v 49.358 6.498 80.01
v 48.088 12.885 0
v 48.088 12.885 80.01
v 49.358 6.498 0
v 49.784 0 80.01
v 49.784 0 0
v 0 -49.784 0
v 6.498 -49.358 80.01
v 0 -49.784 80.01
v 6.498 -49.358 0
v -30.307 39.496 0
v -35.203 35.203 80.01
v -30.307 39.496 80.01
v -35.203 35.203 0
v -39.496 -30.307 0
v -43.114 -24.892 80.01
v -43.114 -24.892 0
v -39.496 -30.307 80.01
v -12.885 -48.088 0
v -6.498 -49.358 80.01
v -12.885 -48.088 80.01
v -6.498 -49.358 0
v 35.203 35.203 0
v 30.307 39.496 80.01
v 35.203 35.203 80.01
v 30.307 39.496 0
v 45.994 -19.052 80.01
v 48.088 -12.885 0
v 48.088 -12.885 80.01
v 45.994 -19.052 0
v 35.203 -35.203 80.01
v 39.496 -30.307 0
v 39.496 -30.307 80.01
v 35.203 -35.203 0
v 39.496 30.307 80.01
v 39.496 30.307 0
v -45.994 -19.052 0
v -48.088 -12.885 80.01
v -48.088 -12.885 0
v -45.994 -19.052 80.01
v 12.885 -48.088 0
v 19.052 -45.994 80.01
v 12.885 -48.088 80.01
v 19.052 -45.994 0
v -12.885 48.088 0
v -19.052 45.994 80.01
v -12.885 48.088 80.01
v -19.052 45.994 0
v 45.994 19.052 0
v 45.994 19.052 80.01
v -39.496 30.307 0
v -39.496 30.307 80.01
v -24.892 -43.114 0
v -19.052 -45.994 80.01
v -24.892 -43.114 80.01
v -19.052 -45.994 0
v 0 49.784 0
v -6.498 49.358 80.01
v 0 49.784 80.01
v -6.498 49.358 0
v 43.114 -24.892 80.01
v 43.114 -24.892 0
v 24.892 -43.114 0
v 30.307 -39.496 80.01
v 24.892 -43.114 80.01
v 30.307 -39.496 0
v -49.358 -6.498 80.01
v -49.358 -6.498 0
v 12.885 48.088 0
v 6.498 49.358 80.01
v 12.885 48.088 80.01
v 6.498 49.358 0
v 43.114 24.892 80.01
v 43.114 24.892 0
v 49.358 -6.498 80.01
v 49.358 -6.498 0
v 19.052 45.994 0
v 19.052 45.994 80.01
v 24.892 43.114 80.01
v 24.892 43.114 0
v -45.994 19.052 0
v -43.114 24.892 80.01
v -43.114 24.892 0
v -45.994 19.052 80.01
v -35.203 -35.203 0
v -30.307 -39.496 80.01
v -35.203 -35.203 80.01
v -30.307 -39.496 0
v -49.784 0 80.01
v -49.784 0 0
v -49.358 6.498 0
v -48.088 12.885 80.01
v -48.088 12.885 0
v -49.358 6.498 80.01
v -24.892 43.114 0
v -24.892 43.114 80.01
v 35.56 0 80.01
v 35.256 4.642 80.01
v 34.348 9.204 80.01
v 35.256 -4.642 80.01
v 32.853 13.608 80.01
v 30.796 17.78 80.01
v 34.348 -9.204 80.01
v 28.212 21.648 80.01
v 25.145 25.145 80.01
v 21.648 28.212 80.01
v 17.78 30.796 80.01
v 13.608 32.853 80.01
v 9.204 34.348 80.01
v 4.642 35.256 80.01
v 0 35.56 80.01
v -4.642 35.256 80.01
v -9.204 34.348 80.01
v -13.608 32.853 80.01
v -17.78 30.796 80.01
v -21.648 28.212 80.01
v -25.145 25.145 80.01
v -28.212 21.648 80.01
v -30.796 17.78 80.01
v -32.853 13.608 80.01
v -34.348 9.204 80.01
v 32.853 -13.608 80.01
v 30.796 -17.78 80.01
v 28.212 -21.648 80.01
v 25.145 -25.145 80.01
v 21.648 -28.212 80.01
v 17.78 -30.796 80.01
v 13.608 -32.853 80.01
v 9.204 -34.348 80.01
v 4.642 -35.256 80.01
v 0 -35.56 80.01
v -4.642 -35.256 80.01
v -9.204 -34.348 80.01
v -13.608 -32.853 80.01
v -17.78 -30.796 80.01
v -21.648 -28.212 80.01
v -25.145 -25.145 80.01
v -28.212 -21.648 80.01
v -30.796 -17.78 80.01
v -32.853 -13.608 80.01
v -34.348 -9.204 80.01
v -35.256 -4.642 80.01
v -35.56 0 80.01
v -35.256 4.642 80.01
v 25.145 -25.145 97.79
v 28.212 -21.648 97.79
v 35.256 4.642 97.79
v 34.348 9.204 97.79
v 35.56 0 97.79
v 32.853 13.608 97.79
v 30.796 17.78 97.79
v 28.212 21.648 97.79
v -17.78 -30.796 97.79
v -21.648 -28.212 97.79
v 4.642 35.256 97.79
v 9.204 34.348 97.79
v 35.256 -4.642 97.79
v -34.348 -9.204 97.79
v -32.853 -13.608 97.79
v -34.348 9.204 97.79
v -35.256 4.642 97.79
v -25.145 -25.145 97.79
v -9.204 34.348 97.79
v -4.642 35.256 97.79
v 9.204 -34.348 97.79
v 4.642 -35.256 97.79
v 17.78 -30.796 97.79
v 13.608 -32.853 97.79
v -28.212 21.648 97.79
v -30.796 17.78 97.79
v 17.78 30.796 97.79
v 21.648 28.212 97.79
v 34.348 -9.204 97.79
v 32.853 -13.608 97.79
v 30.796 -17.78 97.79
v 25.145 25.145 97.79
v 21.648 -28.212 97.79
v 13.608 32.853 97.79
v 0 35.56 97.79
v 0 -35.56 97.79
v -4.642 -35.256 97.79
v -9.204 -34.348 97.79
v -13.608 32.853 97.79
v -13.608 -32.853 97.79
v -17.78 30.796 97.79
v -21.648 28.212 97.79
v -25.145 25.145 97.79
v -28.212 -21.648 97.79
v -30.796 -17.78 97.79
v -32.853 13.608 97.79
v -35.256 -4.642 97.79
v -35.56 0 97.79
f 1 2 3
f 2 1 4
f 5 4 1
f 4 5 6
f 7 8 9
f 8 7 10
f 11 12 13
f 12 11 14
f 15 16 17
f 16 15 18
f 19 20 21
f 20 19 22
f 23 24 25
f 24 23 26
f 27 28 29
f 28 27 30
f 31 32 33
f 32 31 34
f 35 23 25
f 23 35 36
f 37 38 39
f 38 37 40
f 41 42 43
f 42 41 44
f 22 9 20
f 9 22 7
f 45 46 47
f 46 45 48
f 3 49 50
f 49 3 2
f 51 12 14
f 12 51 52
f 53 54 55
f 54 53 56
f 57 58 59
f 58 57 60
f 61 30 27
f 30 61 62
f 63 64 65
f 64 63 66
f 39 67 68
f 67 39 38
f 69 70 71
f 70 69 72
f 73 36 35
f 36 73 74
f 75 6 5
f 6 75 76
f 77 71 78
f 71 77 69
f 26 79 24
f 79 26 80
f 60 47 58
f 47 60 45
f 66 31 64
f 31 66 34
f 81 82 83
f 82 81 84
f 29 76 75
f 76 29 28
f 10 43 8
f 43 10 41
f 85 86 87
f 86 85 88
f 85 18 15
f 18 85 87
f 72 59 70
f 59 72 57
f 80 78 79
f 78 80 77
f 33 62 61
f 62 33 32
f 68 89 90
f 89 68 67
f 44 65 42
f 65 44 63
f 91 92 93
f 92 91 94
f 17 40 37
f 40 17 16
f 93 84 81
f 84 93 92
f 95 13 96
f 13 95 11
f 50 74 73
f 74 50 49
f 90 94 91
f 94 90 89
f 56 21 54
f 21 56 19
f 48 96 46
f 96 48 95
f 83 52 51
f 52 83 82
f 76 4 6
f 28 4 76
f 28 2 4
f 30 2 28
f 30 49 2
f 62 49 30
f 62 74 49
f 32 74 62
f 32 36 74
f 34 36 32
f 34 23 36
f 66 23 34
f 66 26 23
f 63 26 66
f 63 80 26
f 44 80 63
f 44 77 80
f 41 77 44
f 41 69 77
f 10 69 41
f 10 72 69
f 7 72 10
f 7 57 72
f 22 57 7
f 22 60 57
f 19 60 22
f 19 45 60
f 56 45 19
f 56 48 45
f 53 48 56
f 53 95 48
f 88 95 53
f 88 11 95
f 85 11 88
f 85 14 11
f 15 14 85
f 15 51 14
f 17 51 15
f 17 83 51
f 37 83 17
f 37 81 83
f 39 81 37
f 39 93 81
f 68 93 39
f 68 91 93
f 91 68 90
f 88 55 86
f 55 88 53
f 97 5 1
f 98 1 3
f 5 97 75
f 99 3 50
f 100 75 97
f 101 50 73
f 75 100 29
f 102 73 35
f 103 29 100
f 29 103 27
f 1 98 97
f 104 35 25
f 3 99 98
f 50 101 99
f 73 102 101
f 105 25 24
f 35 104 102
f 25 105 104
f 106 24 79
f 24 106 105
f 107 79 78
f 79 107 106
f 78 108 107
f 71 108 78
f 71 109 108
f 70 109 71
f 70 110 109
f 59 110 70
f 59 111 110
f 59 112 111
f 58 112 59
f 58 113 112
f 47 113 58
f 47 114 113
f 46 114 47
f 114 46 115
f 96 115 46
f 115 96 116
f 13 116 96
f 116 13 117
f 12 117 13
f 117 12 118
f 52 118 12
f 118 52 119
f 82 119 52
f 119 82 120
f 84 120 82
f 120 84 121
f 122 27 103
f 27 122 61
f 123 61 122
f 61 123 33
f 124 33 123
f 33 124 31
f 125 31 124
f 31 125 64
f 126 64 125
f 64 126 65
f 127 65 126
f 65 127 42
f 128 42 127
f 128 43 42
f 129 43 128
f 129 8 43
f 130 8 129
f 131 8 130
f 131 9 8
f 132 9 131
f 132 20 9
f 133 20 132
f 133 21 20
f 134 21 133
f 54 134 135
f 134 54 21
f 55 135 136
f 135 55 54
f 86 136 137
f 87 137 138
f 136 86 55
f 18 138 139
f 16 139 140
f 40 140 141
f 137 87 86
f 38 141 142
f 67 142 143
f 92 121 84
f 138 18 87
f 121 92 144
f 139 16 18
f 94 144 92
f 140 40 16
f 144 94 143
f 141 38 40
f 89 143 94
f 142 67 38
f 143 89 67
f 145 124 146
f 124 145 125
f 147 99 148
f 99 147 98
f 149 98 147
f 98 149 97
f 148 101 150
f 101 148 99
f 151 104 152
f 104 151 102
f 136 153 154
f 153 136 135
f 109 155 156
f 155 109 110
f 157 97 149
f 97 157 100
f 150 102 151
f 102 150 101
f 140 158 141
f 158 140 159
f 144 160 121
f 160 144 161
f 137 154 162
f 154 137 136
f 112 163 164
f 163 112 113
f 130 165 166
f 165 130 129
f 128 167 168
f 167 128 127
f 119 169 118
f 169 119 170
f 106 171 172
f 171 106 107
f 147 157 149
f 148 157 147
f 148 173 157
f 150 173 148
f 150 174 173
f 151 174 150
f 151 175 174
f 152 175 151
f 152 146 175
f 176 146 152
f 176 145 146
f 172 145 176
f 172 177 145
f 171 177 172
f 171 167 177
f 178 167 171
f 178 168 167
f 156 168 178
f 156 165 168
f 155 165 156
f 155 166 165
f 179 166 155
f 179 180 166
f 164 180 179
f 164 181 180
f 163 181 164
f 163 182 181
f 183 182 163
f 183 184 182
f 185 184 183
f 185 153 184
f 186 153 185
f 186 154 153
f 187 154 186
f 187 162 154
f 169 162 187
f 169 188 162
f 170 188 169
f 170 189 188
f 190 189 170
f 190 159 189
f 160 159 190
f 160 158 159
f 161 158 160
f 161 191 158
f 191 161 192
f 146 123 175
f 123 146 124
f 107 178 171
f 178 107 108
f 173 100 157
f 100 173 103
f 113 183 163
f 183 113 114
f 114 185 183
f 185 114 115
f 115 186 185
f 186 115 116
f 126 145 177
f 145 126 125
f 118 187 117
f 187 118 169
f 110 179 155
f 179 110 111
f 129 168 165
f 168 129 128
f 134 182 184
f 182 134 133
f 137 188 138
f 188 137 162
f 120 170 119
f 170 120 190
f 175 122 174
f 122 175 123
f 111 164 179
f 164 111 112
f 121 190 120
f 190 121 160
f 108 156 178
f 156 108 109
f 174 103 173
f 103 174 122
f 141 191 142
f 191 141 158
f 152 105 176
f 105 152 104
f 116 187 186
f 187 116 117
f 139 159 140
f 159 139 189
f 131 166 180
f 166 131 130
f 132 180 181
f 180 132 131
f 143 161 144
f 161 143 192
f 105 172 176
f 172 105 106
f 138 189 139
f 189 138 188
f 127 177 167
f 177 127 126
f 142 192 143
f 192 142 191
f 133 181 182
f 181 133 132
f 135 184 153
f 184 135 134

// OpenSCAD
// Auto-generated by scripts/author_from_manifest.py (Phase D.3).
// Source: data/phase_d_manifest.json (sku_intent='anvil-cap-threaded-3in').
// Do not hand-edit — regenerate from the manifest.
//
// @part anvil_cap_threaded_3in
// @kind fitting
// @category fitting.cap
// @display-name "Anvil FIG 1 Threaded Cap 3\""
// @mfg anvil_international
// @mfg-pn FIG_1_3in
// @listing UL FM
// @price-usd 12.50
// @install-minutes 6
// @crew journeyman
// @param size_in number default=3 label="Size" unit="in"
// @port inlet position=[-0.05,0,0] direction=[-1,0,0] style=grooved size_in=3 role=run_a
// @port outlet position=[0.05,0,0] direction=[1,0,0] style=grooved size_in=3 role=run_b

size_in = 3.0;

function od_mm(nps) =
    nps ==   1  ? 33.4 :
    nps == 1.25 ? 42.2 :
    nps == 1.5  ? 48.3 :
    nps ==   2  ? 60.3 :
    nps == 2.5  ? 73.0 :
    nps ==   3  ? 88.9 :
    nps ==   4  ? 114.3 :
    nps ==   5  ? 141.3 :
    nps ==   6  ? 168.3 : 60.3;

od = od_mm(size_in);
h  = od * 0.9;

union() {
    cylinder(h = h, d = od * 1.12, $fn = 48);
    translate([0, 0, h])
        cylinder(h = od * 0.2, d = od * 0.8, $fn = 48);
}
